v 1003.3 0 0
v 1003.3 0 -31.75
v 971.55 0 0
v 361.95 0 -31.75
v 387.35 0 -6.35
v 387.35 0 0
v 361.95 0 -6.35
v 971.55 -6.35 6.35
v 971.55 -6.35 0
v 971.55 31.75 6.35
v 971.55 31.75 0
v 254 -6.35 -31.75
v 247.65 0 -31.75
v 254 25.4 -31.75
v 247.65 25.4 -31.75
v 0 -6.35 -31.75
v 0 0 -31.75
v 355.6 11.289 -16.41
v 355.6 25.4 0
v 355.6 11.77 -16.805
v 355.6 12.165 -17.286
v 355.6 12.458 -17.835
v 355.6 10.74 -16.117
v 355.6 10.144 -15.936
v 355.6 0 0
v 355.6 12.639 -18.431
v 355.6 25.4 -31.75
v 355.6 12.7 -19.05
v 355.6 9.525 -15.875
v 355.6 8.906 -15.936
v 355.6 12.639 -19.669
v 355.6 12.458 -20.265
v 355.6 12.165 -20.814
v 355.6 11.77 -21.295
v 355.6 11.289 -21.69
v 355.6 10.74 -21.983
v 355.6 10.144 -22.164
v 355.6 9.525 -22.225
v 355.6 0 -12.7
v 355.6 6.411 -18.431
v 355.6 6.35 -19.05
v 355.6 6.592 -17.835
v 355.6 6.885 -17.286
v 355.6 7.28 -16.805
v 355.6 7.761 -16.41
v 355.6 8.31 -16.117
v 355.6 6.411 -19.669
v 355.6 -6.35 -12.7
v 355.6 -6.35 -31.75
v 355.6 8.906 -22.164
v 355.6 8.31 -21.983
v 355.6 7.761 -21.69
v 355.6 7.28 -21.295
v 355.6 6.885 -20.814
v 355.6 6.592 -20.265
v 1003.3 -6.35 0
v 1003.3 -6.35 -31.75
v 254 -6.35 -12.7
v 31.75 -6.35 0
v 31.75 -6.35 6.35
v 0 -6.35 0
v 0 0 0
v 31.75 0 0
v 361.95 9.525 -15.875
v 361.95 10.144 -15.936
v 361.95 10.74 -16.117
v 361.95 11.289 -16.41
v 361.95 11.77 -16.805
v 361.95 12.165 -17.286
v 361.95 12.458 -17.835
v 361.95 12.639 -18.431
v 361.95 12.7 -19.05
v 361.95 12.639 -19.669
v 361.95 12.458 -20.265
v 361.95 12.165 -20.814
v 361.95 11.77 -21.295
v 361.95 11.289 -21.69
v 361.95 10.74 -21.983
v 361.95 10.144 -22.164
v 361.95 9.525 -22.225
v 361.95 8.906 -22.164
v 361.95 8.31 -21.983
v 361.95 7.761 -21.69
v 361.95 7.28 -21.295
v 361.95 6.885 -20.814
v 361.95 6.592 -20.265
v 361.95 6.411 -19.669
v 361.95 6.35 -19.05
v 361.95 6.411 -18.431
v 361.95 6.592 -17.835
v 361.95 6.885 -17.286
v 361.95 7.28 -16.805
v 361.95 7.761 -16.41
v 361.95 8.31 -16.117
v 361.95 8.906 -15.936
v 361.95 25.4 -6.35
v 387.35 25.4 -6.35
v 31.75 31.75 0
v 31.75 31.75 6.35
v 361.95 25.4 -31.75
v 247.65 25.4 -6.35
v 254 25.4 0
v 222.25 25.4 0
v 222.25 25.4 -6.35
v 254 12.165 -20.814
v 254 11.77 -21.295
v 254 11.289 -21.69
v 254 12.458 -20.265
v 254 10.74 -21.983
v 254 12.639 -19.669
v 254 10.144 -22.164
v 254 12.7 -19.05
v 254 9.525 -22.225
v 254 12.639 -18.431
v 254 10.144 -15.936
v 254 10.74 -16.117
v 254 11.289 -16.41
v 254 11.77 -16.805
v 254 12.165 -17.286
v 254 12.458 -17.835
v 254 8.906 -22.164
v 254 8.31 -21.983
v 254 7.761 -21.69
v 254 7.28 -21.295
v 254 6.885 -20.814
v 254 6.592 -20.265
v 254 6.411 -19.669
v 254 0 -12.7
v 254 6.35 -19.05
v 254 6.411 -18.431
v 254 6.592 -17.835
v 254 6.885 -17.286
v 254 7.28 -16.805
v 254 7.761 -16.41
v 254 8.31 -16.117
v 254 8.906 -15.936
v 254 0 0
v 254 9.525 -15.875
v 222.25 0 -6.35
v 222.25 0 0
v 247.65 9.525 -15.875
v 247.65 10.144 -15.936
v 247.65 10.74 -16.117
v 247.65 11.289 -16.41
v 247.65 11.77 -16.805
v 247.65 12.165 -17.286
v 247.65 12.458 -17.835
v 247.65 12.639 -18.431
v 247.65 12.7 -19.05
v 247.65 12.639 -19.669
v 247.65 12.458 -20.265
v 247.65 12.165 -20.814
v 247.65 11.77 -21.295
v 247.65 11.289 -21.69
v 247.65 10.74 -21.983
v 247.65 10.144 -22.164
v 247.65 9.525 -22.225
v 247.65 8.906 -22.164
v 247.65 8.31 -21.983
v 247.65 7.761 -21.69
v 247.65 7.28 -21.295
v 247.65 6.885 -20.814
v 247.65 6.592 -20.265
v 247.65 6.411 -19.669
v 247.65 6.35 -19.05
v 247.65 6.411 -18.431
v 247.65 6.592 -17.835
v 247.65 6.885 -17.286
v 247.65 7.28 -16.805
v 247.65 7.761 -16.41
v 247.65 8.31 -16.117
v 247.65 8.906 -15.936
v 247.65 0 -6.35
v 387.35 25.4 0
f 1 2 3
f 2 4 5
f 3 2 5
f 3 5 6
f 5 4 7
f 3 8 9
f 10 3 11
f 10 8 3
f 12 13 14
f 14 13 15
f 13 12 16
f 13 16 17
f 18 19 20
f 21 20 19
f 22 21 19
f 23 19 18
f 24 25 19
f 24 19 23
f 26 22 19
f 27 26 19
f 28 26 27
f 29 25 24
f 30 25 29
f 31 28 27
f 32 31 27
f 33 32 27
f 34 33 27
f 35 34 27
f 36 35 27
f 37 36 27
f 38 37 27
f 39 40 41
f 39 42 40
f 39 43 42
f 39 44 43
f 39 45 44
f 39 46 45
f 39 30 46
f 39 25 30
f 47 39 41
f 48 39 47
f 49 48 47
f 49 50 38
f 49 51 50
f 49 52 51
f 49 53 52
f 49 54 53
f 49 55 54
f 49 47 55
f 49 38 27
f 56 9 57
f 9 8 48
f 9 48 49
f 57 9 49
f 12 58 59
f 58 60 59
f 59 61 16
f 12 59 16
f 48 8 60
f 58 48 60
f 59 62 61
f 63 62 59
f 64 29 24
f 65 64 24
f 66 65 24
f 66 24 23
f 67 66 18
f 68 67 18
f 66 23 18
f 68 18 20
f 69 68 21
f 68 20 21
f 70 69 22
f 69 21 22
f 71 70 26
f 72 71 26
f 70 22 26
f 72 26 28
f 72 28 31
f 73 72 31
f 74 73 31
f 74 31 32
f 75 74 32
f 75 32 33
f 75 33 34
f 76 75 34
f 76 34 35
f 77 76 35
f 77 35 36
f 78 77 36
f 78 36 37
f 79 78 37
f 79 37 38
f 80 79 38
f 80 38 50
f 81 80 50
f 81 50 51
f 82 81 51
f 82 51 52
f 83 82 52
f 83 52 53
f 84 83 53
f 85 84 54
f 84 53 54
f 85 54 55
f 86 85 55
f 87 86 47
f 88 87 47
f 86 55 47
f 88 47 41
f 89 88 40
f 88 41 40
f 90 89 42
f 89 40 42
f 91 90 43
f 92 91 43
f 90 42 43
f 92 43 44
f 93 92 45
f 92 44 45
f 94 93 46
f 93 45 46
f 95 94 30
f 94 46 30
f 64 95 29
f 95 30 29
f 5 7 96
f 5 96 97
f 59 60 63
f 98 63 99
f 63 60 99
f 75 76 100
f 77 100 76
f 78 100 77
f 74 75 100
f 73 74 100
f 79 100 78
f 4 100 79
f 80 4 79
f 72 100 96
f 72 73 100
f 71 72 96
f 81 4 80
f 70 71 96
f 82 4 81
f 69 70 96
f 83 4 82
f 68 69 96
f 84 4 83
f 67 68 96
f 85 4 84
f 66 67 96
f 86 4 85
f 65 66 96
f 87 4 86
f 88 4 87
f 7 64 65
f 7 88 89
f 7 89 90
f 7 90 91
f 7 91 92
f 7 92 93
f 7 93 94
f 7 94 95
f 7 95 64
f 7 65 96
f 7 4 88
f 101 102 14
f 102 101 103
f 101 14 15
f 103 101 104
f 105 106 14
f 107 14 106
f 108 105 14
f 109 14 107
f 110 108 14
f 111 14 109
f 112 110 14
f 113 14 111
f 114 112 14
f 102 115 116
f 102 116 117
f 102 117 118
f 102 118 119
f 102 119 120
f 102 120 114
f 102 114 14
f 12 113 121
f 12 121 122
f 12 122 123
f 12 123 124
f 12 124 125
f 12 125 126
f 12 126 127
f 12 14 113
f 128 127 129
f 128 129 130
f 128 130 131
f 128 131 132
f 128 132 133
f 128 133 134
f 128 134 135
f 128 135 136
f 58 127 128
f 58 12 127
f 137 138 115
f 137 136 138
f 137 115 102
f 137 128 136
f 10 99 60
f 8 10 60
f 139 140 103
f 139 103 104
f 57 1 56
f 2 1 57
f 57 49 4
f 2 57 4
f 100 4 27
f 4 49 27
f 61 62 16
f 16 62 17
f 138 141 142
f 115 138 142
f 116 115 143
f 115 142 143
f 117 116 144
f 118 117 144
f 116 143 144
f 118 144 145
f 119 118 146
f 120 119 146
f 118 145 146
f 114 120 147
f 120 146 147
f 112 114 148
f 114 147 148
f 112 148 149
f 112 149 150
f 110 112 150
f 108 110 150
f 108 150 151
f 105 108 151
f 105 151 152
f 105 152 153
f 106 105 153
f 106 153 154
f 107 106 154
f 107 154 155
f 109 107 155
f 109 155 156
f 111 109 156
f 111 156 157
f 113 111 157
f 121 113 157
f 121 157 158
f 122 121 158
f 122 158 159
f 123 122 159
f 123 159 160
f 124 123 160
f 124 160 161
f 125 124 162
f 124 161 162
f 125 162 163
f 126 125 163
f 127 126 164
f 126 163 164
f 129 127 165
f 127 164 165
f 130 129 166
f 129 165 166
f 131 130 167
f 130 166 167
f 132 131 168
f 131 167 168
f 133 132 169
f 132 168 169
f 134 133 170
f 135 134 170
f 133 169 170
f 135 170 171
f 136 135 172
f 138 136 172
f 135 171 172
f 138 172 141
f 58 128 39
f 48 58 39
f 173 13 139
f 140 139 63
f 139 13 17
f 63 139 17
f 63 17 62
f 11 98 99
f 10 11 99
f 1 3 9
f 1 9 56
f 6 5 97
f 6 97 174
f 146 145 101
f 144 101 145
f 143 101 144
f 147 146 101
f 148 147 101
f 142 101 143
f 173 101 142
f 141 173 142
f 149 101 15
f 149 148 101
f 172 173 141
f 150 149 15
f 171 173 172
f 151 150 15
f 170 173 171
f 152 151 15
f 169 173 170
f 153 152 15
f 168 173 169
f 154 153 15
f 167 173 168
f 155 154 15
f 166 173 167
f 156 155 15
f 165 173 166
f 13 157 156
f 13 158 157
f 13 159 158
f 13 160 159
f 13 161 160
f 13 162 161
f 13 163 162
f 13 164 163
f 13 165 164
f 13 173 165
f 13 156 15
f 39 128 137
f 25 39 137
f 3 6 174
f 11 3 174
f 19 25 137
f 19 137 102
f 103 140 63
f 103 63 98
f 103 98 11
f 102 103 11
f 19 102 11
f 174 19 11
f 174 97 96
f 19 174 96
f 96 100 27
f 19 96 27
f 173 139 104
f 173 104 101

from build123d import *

# Parameters (mm, degrees)
BOSS_EXTRUDE1_DEPTH = 1003.3
BOSS_EXTRUDE2_DEPTH = 25.4
SKETCH3_W           = 101.6
SKETCH3_H           = 19.05
CUT_EXTRUDE1_DEPTH  = 7.35
SKETCH4_R           = 3.175
CUT_EXTRUDE2_DEPTH  = 756.65
SKETCH5_W           = 31.75
SKETCH5_H           = 38.1
CUT_EXTRUDE3_DEPTH  = 6.35


with BuildPart() as part:
    # Sketch1 → Boss-Extrude1 (new body)
    with BuildSketch(Plane(origin=(0, 0, 0), x_dir=(0, 0, -1), z_dir=(1, 0, 0))):
        Polygon((0, 0), (0, 31.75), (-6.35, 31.75), (-6.35, -6.35), (31.75, -6.35), (31.75, 0), align=None)
    extrude(amount=BOSS_EXTRUDE1_DEPTH)

    # Sketch2 → Boss-Extrude2 (add)
    with BuildSketch(Plane(origin=(0, 0, 0), x_dir=(1, 0, 0), z_dir=(0, 1, 0))):
        Polygon((247.65, 31.75), (254, 31.75), (254, 0), (222.25, 0), (222.25, 6.35), (247.65, 6.35), align=None)
        Polygon((387.35, 6.35), (387.35, 0), (355.6, 0), (355.6, 31.75), (361.95, 31.75), (361.95, 6.35), align=None)
    extrude(amount=BOSS_EXTRUDE2_DEPTH)

    # Sketch3 → Cut-Extrude1 (cut, through all)
    with BuildSketch(Plane(origin=(0, 0, 0), x_dir=(1, 0, 0), z_dir=(0, 1, 0))):
        with Locations((304.8, 22.225)):
            Rectangle(SKETCH3_W, SKETCH3_H)
    extrude(amount=-CUT_EXTRUDE1_DEPTH, mode=Mode.SUBTRACT)

    # Sketch4 → Cut-Extrude2 (cut, through all)
    with BuildSketch(Plane.ZY.offset(-247.65)):
        with Locations((-19.05, 9.525)):
            Circle(SKETCH4_R)
    extrude(amount=-CUT_EXTRUDE2_DEPTH, mode=Mode.SUBTRACT)

    # Sketch5 → Cut-Extrude3 (cut)
    with BuildSketch(Plane.XY.offset(6.35)):
        with Locations((15.875, 12.7)):
            Rectangle(SKETCH5_W, SKETCH5_H)
        with Locations((987.425, 12.7)):
            Rectangle(SKETCH5_W, SKETCH5_H)
    extrude(amount=-CUT_EXTRUDE3_DEPTH, mode=Mode.SUBTRACT)


solid = part.part
